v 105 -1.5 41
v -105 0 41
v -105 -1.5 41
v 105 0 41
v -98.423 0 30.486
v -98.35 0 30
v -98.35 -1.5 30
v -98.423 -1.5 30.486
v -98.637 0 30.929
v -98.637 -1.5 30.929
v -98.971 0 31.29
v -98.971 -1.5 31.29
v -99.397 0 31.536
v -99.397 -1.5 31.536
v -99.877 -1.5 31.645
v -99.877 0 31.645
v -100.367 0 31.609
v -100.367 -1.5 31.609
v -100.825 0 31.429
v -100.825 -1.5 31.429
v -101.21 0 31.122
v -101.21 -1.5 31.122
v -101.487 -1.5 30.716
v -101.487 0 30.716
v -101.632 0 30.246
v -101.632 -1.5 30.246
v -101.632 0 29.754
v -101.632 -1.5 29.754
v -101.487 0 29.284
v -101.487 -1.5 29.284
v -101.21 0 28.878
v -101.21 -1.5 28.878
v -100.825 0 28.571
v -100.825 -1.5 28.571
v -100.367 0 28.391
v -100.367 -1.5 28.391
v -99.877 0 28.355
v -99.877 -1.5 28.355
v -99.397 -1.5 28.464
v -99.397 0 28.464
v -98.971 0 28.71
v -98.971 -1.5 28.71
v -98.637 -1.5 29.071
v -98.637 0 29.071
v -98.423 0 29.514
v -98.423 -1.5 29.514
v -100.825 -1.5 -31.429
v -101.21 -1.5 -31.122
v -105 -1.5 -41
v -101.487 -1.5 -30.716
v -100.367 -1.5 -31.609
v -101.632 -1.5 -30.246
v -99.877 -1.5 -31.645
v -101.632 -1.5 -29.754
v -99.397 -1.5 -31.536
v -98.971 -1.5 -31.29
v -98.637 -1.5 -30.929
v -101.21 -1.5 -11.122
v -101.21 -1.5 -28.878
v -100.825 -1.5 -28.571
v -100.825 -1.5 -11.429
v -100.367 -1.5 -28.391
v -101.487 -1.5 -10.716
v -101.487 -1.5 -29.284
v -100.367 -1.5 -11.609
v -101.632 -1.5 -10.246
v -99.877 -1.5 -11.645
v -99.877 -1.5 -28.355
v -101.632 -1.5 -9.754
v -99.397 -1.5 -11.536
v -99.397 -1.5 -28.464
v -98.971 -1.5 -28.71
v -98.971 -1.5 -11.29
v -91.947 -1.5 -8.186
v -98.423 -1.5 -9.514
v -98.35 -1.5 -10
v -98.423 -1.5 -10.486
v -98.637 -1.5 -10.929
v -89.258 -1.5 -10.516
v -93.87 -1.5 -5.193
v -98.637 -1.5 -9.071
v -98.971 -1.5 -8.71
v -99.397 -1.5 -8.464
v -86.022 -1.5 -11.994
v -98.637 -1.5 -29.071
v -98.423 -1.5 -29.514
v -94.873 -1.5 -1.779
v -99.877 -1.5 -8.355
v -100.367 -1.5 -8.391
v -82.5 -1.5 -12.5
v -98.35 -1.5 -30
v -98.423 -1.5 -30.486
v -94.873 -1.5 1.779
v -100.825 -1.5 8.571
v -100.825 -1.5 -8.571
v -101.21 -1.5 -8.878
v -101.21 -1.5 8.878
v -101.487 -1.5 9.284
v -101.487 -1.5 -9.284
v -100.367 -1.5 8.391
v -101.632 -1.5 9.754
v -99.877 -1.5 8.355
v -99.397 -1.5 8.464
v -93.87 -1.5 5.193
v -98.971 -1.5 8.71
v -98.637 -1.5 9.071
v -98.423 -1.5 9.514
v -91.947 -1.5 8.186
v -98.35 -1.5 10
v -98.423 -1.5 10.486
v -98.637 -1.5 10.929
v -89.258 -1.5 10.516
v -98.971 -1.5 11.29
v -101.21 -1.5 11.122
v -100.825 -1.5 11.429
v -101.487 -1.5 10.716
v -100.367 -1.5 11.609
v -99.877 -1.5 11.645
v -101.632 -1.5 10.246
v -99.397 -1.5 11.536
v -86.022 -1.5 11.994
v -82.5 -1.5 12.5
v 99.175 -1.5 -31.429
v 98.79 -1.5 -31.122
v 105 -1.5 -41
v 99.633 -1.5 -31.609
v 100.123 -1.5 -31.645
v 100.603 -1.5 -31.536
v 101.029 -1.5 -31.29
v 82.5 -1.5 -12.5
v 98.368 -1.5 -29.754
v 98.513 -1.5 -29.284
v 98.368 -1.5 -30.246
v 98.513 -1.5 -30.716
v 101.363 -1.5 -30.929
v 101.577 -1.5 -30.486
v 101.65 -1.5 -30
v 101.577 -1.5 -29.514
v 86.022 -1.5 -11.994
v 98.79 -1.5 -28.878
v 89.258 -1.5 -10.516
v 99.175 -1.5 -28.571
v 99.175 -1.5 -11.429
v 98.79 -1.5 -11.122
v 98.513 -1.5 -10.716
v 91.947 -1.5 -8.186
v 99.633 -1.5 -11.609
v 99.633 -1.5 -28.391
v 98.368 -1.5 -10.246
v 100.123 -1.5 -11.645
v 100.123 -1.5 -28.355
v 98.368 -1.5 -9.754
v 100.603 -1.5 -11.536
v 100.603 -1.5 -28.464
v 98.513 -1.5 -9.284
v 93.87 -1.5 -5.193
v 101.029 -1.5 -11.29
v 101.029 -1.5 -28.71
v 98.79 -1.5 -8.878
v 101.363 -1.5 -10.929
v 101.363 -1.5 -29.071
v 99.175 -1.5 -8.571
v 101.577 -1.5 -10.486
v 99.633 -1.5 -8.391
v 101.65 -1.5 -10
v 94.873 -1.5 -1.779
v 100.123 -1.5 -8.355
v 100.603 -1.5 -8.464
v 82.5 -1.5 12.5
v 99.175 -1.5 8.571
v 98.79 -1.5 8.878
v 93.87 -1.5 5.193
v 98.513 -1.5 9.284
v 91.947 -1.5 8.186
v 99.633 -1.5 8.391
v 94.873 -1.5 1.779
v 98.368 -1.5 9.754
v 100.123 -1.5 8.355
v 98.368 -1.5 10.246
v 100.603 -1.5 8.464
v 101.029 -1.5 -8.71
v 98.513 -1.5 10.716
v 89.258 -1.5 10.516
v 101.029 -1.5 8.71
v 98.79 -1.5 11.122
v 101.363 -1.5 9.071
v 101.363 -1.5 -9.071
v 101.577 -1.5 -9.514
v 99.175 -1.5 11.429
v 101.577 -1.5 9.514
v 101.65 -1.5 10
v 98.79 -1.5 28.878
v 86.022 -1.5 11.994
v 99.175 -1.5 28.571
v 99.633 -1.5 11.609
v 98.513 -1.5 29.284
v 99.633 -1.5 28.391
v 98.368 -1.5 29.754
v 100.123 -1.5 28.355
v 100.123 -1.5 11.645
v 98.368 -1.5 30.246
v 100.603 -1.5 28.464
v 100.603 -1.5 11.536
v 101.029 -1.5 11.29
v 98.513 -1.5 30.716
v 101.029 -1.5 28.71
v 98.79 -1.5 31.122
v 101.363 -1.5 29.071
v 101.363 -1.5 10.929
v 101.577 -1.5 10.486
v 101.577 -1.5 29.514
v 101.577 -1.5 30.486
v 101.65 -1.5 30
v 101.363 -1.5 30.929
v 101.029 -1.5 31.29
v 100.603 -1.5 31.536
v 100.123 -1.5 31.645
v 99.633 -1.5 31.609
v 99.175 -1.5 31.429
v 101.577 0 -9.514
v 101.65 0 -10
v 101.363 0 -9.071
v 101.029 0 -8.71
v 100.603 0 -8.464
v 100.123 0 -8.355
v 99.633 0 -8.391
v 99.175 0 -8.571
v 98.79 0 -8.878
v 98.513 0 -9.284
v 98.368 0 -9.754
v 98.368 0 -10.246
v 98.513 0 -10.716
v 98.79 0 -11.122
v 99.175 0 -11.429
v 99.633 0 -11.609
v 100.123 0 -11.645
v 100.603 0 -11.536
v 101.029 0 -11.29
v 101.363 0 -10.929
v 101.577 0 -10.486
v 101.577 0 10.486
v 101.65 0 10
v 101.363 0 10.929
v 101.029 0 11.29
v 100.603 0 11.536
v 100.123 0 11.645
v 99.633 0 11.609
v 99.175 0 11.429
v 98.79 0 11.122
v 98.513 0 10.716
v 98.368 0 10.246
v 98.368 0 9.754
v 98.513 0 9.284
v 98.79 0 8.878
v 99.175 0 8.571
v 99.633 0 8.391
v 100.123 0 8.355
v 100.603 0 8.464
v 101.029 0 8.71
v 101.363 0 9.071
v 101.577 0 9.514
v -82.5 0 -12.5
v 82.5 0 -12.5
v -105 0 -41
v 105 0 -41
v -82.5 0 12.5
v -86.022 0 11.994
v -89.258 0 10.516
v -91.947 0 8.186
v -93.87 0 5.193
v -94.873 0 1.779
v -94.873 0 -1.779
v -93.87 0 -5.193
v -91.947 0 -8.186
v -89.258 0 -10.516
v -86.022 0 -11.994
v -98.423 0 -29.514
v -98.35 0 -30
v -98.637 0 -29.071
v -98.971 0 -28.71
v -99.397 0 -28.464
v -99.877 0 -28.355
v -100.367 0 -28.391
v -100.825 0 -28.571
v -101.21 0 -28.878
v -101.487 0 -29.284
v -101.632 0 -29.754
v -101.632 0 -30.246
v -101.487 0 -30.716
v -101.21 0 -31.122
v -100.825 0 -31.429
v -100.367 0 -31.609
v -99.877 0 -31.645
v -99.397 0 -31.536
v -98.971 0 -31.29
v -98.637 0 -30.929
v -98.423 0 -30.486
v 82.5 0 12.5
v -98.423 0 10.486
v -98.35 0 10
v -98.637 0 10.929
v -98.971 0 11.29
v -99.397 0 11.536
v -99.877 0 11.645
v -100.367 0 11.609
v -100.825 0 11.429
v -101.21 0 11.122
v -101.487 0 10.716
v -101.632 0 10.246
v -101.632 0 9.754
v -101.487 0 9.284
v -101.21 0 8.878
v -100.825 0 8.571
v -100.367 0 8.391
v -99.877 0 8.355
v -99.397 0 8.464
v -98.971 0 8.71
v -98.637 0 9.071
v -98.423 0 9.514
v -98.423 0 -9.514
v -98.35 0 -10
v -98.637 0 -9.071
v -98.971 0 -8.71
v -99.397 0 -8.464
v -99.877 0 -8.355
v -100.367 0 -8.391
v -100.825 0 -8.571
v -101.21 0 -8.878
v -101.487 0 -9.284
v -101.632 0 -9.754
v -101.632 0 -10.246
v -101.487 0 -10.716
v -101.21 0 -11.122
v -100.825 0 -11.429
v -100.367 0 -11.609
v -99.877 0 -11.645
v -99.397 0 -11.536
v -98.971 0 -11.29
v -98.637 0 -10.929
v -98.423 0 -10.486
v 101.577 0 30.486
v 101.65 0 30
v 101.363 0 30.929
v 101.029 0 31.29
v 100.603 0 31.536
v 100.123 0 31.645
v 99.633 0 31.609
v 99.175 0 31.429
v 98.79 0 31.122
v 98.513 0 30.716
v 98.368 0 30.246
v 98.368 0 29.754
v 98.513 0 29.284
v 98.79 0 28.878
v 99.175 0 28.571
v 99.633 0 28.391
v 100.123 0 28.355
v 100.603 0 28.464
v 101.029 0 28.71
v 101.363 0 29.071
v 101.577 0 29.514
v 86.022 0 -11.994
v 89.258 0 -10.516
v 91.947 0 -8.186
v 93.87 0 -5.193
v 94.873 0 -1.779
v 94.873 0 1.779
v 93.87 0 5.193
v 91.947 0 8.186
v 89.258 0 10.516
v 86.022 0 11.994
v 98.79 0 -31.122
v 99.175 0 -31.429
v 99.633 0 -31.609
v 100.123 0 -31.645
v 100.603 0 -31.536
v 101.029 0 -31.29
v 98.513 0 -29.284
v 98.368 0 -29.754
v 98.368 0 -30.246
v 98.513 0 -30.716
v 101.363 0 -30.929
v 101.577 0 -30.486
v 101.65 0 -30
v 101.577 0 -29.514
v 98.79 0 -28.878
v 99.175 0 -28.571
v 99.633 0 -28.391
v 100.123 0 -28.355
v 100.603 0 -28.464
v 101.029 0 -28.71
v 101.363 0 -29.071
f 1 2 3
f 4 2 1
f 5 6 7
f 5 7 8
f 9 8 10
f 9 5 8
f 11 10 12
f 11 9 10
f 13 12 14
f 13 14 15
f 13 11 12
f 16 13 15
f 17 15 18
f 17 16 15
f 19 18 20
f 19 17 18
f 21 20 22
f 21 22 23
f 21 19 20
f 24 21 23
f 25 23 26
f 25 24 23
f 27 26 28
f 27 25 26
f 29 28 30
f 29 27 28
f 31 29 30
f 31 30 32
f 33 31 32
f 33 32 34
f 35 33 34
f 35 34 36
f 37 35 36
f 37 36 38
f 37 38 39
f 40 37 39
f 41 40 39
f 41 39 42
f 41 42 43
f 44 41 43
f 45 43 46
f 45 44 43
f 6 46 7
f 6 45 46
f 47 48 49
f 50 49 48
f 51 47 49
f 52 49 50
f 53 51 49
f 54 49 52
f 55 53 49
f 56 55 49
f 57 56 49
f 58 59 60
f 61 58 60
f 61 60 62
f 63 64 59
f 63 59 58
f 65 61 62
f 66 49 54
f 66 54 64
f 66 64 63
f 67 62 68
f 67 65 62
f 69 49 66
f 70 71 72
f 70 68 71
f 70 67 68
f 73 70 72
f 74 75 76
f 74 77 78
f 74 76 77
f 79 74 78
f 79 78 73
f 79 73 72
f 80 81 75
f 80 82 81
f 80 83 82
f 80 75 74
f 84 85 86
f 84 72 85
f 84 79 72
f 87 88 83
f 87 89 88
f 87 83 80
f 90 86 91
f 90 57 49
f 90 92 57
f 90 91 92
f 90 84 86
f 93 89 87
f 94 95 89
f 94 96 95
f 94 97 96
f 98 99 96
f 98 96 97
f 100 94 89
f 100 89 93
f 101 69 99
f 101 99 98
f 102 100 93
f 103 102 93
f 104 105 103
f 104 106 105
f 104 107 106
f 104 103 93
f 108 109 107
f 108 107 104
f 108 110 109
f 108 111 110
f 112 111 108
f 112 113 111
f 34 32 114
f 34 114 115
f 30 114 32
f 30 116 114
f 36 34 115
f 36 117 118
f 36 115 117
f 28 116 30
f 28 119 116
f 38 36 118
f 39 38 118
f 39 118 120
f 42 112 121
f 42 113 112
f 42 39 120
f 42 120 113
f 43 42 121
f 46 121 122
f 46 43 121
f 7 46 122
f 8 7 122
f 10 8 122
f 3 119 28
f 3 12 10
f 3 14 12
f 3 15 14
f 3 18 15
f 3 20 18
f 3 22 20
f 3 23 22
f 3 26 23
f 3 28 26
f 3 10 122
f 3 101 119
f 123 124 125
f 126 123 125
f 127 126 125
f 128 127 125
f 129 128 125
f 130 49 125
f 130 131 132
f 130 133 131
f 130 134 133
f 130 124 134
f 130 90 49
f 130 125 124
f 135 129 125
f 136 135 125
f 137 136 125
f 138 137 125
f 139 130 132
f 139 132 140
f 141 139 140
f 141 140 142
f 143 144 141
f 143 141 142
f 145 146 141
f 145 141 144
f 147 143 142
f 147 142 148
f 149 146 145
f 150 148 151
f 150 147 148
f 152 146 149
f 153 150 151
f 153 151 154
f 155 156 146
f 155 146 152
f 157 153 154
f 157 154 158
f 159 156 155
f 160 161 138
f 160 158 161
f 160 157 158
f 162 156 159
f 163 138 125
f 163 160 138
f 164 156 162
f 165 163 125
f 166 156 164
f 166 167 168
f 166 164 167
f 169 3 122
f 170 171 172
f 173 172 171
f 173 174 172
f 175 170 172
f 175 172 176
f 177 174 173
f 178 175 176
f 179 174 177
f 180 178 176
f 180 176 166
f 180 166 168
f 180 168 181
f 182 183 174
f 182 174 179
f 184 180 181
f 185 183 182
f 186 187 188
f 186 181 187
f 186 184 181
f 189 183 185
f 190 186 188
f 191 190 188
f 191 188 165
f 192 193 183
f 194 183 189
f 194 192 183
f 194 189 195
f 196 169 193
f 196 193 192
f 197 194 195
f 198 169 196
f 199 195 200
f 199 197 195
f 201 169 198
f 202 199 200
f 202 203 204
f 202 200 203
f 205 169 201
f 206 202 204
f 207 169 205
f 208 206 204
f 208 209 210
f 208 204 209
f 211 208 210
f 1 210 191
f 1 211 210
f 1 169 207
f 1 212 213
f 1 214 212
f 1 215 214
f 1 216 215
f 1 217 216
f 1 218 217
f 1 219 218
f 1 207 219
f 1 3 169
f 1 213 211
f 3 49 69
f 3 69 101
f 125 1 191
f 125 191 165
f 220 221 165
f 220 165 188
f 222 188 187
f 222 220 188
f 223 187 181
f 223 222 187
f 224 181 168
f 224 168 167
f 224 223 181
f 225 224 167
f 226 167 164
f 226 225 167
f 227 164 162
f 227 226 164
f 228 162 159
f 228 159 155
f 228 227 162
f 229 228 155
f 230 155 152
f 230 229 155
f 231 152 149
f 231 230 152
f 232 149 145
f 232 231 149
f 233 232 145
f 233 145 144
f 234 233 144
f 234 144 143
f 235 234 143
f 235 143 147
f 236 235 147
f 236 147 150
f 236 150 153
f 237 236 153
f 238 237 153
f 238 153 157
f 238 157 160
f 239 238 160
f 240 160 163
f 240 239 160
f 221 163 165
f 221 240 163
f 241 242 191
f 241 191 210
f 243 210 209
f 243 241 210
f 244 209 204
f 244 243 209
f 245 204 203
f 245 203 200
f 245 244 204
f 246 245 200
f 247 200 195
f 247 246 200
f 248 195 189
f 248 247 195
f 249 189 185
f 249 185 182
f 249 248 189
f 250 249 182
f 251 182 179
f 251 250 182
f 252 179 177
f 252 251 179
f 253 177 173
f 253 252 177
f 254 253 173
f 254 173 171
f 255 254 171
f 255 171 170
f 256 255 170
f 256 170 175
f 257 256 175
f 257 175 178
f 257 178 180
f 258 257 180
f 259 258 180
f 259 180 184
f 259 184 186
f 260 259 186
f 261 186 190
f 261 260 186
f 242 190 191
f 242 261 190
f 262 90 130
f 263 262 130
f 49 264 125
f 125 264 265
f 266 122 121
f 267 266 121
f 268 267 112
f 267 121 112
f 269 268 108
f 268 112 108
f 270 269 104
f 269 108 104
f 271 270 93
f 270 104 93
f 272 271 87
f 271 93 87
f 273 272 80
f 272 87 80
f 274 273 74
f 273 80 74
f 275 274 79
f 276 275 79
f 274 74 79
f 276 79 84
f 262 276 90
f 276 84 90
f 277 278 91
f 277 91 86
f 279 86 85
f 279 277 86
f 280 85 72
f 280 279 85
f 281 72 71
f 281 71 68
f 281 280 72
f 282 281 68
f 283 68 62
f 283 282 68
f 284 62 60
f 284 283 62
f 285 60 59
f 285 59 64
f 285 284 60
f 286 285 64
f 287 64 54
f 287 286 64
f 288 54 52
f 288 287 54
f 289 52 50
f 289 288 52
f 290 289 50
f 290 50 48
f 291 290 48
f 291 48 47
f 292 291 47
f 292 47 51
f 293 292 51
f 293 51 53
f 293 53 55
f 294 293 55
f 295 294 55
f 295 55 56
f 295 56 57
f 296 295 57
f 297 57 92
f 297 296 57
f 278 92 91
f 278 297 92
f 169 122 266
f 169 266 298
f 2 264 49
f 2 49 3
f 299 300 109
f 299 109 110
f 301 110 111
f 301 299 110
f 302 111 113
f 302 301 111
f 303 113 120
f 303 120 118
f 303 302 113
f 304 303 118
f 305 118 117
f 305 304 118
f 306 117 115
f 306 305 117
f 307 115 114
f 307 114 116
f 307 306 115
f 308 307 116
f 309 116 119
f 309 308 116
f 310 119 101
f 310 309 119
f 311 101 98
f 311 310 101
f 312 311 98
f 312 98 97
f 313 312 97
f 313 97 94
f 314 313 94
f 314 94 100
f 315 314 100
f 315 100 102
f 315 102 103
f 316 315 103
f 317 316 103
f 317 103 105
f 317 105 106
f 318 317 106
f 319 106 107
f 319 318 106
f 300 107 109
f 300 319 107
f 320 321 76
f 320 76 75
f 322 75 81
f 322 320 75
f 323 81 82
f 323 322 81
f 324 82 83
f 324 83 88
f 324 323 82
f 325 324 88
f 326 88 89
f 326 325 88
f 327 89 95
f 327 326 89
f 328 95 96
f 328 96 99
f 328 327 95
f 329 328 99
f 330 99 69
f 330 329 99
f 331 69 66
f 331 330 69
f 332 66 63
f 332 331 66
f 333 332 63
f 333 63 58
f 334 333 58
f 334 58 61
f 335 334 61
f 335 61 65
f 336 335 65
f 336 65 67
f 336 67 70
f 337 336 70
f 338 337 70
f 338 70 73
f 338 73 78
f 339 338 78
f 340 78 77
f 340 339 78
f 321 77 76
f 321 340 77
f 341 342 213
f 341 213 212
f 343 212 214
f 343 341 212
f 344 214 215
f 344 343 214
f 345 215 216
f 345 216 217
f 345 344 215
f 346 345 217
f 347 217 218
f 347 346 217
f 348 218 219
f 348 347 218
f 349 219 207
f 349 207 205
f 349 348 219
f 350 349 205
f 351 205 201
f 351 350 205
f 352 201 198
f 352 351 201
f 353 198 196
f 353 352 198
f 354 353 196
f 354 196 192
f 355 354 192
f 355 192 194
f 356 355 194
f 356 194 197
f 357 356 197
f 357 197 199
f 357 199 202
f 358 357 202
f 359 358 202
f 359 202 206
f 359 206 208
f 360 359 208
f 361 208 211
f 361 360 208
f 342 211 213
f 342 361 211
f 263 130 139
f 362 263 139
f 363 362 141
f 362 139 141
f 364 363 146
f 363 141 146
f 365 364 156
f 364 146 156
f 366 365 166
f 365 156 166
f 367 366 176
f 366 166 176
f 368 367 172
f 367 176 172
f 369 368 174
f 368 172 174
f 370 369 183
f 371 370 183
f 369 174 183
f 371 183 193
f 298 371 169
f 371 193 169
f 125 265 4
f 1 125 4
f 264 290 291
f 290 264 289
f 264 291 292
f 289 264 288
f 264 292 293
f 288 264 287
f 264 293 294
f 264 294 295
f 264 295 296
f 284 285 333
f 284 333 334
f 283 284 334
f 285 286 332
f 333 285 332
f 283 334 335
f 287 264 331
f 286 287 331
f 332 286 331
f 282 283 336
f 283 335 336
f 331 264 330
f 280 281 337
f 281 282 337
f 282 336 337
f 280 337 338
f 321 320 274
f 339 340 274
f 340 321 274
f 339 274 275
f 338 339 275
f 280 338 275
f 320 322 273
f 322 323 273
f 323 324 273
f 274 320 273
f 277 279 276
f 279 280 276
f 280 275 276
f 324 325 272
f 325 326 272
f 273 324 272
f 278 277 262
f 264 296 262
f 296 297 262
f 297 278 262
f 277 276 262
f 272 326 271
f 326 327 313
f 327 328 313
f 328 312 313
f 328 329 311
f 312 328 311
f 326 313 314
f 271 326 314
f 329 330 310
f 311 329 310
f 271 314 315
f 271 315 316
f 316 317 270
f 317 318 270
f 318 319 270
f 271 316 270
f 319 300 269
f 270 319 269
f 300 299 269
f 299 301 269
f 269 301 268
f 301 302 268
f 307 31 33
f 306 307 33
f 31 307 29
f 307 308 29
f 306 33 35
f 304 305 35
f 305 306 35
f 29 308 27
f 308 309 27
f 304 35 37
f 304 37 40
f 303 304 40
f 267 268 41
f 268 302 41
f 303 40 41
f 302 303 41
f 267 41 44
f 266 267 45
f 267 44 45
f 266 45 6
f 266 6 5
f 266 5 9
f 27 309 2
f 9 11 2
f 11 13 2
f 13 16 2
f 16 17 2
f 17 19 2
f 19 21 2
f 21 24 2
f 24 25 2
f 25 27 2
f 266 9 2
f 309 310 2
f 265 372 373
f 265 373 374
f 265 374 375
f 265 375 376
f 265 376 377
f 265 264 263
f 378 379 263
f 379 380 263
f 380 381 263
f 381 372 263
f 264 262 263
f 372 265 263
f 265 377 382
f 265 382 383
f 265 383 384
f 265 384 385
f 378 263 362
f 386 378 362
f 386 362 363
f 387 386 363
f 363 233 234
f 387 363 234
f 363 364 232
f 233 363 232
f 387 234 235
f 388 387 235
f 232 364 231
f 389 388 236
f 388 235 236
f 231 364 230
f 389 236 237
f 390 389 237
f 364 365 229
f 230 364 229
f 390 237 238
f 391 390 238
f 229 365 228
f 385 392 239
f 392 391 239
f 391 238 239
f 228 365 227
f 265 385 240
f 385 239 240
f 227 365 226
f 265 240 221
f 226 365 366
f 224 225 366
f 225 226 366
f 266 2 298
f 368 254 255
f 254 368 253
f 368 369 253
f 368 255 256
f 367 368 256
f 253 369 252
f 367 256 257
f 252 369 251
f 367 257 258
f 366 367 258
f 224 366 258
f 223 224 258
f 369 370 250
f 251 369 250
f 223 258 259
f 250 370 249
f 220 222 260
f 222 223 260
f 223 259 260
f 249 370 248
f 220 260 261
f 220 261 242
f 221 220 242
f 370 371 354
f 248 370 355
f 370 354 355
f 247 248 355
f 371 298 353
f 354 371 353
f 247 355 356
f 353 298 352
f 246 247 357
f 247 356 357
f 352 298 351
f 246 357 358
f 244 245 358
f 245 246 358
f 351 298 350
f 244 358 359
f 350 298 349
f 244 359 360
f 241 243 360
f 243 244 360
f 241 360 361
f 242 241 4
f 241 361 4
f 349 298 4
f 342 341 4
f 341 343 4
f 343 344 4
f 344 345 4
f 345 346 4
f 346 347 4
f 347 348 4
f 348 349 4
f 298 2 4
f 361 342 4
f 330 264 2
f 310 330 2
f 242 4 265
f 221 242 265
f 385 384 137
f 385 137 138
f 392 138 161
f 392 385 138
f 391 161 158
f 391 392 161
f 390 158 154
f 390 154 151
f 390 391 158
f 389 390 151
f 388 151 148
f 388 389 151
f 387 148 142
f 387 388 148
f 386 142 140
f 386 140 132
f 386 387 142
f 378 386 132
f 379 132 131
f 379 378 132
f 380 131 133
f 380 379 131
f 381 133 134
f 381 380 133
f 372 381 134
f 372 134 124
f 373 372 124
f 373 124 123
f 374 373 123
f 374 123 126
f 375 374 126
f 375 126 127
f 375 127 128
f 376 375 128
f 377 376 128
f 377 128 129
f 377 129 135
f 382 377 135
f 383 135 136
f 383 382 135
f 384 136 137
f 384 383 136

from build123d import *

# Parameters (mm, degrees)
SKETCH_W     = 210
SKETCH_H     = 82
SKETCH_R     = 1.65
PAD_DEPTH    = 1.5
POCKET_DEPTH = 1.501


with BuildPart() as part:
    # Sketch → Pad (new body)
    with BuildSketch(Plane.XZ):
        Rectangle(SKETCH_W, SKETCH_H)
        with Locations((100, 30)):
            Circle(SKETCH_R, mode=Mode.SUBTRACT)
        with Locations((100, 10)):
            Circle(SKETCH_R, mode=Mode.SUBTRACT)
        with Locations((100, -30)):
            Circle(SKETCH_R, mode=Mode.SUBTRACT)
        with Locations((100, -10)):
            Circle(SKETCH_R, mode=Mode.SUBTRACT)
        with Locations((-100, 30)):
            Circle(SKETCH_R, mode=Mode.SUBTRACT)
        with Locations((-100, 10)):
            Circle(SKETCH_R, mode=Mode.SUBTRACT)
        with Locations((-100, -30)):
            Circle(SKETCH_R, mode=Mode.SUBTRACT)
        with Locations((-100, -10)):
            Circle(SKETCH_R, mode=Mode.SUBTRACT)
    extrude(amount=PAD_DEPTH)

    # Sketch002 → Pocket (cut, through all)
    with BuildSketch(Plane.XZ.offset(1.5)):
        with BuildLine():
            ThreePointArc((-82.5, 12.5), (-95, 0), (-82.5, -12.5))
            Line((-82.5, -12.5), (82.5, -12.5))
            ThreePointArc((82.5, -12.5), (95, 0), (82.5, 12.5))
            Line((-82.5, 12.5), (82.5, 12.5))
        make_face()
    extrude(amount=-POCKET_DEPTH, mode=Mode.SUBTRACT)


solid = part.part
